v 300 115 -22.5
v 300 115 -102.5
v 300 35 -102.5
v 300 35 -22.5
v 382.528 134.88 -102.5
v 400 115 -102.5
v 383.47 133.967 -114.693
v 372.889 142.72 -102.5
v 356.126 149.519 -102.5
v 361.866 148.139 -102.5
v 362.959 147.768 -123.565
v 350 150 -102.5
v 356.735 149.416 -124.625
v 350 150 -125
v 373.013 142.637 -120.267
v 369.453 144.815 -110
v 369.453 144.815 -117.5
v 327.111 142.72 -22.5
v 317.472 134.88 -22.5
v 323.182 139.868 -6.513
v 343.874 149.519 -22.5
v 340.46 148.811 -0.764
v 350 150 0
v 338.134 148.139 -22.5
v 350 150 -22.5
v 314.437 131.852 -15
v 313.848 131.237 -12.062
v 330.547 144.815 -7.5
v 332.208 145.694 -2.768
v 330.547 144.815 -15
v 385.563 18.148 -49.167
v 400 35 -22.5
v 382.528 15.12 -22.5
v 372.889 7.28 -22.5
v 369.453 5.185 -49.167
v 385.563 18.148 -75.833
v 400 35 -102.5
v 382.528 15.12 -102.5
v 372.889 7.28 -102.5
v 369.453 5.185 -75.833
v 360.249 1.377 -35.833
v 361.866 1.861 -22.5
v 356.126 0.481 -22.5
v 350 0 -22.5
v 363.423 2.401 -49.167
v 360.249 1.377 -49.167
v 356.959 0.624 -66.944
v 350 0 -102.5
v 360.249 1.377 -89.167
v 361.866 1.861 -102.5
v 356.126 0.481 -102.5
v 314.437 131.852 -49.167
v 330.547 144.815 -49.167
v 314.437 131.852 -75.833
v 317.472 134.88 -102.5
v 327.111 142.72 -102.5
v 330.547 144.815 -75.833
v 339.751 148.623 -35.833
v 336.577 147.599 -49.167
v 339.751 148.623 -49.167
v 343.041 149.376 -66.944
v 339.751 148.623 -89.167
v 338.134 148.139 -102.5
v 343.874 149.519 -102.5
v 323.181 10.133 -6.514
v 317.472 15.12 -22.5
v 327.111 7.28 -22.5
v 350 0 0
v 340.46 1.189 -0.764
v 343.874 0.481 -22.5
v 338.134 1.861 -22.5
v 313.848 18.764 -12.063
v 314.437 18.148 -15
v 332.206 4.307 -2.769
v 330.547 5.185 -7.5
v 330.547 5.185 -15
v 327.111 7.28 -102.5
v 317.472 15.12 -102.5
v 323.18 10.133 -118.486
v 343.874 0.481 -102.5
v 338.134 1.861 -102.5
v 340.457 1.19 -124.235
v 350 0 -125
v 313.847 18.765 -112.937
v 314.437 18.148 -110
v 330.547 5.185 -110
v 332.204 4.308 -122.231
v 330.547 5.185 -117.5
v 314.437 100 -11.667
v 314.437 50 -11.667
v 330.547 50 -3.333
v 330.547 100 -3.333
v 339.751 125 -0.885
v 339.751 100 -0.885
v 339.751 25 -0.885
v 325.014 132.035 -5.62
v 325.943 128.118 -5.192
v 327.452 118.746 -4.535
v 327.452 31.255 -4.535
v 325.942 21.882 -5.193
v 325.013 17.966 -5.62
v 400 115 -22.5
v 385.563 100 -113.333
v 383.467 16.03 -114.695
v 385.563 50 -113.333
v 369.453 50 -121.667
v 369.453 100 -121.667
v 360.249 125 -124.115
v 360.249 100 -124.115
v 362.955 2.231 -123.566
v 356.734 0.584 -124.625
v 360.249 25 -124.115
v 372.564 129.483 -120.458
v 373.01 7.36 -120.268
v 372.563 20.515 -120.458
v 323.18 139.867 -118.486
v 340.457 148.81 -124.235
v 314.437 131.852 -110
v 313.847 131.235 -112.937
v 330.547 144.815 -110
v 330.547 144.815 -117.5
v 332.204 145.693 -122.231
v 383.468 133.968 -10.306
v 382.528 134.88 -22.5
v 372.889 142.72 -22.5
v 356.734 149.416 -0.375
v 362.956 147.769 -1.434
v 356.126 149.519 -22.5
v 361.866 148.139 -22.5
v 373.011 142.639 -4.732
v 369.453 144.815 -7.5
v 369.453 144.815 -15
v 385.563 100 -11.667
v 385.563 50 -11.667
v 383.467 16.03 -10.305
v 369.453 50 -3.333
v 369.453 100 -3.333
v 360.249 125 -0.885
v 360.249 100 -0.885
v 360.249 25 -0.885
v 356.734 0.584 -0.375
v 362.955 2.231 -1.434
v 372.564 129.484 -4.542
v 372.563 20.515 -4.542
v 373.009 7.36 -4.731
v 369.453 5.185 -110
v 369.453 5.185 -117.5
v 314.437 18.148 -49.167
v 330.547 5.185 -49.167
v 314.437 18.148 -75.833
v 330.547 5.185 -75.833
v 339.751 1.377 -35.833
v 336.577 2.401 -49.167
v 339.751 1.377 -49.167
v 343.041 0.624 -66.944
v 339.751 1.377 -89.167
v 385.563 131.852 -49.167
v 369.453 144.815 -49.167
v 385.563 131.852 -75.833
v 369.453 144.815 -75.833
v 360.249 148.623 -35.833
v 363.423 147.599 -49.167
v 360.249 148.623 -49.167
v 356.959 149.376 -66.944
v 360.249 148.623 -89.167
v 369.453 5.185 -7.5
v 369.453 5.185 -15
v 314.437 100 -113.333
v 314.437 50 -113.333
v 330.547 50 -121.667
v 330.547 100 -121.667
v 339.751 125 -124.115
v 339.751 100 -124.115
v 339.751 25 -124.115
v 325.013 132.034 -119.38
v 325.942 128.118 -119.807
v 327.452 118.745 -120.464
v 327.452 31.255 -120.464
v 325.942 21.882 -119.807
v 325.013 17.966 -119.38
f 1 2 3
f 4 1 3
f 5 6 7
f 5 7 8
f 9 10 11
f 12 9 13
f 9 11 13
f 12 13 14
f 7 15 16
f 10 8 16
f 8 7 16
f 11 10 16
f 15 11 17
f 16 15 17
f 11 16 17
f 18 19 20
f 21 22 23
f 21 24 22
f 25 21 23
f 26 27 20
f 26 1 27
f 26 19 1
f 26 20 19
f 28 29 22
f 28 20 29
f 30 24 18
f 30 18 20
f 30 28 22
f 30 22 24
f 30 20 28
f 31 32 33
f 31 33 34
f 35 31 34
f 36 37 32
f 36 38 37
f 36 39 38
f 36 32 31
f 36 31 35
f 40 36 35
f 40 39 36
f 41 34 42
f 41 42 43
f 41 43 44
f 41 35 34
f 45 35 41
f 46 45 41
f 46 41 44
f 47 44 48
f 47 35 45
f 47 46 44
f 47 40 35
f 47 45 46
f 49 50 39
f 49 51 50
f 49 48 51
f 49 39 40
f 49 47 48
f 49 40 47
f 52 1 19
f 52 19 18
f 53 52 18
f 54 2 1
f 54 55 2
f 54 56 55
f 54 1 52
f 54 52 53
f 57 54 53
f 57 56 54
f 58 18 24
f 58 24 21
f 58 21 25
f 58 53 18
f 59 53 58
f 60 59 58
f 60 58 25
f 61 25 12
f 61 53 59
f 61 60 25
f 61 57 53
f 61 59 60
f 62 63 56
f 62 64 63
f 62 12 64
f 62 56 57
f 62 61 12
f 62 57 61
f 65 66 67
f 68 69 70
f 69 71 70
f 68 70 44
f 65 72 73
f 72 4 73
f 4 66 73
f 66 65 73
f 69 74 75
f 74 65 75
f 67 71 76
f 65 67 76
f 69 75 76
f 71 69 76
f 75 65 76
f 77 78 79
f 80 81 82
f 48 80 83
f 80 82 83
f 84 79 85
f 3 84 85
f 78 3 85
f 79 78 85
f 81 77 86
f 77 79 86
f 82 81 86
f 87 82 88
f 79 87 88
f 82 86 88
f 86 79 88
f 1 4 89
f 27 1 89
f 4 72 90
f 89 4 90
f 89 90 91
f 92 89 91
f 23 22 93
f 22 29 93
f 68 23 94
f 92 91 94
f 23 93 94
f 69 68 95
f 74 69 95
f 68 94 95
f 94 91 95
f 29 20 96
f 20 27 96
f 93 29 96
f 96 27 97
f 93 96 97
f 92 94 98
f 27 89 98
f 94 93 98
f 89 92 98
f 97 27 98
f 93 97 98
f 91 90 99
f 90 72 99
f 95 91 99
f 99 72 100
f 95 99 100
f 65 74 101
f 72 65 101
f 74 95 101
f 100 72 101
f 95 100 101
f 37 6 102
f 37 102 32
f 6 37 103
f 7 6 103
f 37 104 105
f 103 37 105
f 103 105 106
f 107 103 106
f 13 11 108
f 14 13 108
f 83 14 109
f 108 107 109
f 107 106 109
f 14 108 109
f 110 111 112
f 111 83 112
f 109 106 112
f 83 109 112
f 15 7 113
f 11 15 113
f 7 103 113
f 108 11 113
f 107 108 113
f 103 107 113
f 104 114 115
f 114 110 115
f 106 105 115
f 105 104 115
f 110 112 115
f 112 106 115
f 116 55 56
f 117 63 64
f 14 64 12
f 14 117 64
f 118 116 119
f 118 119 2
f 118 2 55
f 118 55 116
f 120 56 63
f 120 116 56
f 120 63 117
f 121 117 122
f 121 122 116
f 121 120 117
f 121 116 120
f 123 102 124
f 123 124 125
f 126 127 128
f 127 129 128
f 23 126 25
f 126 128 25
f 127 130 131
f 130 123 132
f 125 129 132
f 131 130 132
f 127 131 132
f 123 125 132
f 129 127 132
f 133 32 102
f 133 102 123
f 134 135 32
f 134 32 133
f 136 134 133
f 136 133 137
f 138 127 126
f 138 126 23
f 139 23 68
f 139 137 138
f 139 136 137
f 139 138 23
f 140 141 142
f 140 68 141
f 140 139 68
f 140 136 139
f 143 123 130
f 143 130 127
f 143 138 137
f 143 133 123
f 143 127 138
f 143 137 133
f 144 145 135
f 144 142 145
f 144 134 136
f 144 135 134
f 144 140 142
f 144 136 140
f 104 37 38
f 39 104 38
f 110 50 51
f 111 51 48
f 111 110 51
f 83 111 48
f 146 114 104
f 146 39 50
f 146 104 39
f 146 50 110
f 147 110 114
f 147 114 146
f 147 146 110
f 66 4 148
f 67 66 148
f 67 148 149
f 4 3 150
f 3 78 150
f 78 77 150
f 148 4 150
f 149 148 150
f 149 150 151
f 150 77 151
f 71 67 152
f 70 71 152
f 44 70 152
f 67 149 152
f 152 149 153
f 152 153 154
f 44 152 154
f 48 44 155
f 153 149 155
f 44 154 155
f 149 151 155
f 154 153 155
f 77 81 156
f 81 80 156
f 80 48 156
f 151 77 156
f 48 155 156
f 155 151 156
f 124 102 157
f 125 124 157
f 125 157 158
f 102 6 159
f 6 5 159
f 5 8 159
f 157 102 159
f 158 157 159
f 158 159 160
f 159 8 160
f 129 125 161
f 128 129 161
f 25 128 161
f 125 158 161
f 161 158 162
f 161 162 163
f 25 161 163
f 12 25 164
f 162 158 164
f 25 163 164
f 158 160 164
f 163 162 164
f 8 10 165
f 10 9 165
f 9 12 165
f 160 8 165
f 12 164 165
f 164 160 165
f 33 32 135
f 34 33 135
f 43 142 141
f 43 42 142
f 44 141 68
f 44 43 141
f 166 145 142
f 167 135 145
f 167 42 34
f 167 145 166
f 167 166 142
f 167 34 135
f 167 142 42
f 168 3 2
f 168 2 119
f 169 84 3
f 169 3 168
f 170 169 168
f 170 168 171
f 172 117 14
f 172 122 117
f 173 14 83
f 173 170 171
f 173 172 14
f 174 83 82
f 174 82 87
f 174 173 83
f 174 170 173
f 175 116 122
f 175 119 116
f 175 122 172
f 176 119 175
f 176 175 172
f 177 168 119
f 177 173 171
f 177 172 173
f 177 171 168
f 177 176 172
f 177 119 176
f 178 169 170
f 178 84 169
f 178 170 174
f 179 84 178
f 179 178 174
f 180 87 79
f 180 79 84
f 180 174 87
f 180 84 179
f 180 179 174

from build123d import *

# Parameters (mm, degrees)
LOFT1_START   = -102.5
LOFT1_DEPTH   = 79.9999999
LOFT1_START_2 = -1e-07
LOFT1_2_DEPTH = 150.0000001
LOFT1_START_3 = -126
LOFT1_3_DEPTH = 127


with BuildPart() as part:
    # Loft1: read off the stored shape, not the designer's step
    # Loft1 outline → Loft1 (new body)
    with BuildSketch(Plane.XY.offset(LOFT1_START)):
        with BuildLine():
            add(Edge.make_bspline(
                [(300, 35), (314.158656807, 17.5), (328.317313615, 0), (350, 0)],
                knots=[0, 0, 0, 0, 1, 1, 1, 1], degree=3))
            Line((350, 0), (350, 150))
            add(Edge.make_bspline(
                [(300, 115), (314.158656807, 132.5), (328.317313615, 150), (350, 150)],
                knots=[0, 0, 0, 0, 1, 1, 1, 1], degree=3))
            Line((300, 115), (300, 35))
        make_face()
    loft1 = extrude(amount=LOFT1_DEPTH)

    # Loft1 2 outline → Loft1 2 (add)
    with BuildSketch(Plane(origin=(0, 0, 0), x_dir=(1, 0, 0), z_dir=(0, 1, 0)).offset(LOFT1_START_2)):
        with BuildLine():
            Line((350, 22.5000001), (300, 22.5))
            add(Edge.make_bspline(
                [(300, 22.5), (314.158656807, 11.25), (328.317313615, 0), (350, 0)],
                knots=[0, 0, 0, 0, 1, 1, 1, 1], degree=3))
            Line((350, 0), (350, 22.5000001))
        make_face()
        with BuildLine():
            Line((300, 102.5), (350, 102.5))
            Line((350, 102.5), (350, 125))
            add(Edge.make_bspline(
                [(300, 102.5), (314.158656807, 113.75), (328.317313615, 125), (350, 125)],
                knots=[0, 0, 0, 0, 1, 1, 1, 1], degree=3))
        make_face()
    loft1_2 = extrude(amount=LOFT1_2_DEPTH)

    # Loft1 3 outline → Loft1 3 (cut)
    with BuildSketch(Plane.XY.offset(LOFT1_START_3)):
        with BuildLine():
            Line((300, 35), (300, -1e-07))
            Line((300, -1e-07), (350, 0))
            add(Edge.make_bspline(
                [(300, 35), (314.158656807, 17.5), (328.317313615, 0), (350, 0)],
                knots=[0, 0, 0, 0, 1, 1, 1, 1], degree=3))
        make_face()
        with BuildLine():
            Line((300, 150), (300, 115))
            add(Edge.make_bspline(
                [(300, 115), (314.158656807, 132.5), (328.317313615, 150), (350, 150)],
                knots=[0, 0, 0, 0, 1, 1, 1, 1], degree=3))
            Line((350, 150), (300, 150))
        make_face()
    loft1_3 = extrude(amount=LOFT1_3_DEPTH, mode=Mode.SUBTRACT)

    # Mirror1: Loft1, Loft1 2, Loft1 3 across plane
    add(loft1.mirror(Plane(origin=(350, 0, 0), x_dir=(0, 0, 1), z_dir=(1, 0, 0))))
    add(loft1_2.mirror(Plane(origin=(350, 0, 0), x_dir=(0, 0, 1), z_dir=(1, 0, 0))))
    add(loft1_3.mirror(Plane(origin=(350, 0, 0), x_dir=(0, 0, 1), z_dir=(1, 0, 0))), mode=Mode.SUBTRACT)


solid = part.part
